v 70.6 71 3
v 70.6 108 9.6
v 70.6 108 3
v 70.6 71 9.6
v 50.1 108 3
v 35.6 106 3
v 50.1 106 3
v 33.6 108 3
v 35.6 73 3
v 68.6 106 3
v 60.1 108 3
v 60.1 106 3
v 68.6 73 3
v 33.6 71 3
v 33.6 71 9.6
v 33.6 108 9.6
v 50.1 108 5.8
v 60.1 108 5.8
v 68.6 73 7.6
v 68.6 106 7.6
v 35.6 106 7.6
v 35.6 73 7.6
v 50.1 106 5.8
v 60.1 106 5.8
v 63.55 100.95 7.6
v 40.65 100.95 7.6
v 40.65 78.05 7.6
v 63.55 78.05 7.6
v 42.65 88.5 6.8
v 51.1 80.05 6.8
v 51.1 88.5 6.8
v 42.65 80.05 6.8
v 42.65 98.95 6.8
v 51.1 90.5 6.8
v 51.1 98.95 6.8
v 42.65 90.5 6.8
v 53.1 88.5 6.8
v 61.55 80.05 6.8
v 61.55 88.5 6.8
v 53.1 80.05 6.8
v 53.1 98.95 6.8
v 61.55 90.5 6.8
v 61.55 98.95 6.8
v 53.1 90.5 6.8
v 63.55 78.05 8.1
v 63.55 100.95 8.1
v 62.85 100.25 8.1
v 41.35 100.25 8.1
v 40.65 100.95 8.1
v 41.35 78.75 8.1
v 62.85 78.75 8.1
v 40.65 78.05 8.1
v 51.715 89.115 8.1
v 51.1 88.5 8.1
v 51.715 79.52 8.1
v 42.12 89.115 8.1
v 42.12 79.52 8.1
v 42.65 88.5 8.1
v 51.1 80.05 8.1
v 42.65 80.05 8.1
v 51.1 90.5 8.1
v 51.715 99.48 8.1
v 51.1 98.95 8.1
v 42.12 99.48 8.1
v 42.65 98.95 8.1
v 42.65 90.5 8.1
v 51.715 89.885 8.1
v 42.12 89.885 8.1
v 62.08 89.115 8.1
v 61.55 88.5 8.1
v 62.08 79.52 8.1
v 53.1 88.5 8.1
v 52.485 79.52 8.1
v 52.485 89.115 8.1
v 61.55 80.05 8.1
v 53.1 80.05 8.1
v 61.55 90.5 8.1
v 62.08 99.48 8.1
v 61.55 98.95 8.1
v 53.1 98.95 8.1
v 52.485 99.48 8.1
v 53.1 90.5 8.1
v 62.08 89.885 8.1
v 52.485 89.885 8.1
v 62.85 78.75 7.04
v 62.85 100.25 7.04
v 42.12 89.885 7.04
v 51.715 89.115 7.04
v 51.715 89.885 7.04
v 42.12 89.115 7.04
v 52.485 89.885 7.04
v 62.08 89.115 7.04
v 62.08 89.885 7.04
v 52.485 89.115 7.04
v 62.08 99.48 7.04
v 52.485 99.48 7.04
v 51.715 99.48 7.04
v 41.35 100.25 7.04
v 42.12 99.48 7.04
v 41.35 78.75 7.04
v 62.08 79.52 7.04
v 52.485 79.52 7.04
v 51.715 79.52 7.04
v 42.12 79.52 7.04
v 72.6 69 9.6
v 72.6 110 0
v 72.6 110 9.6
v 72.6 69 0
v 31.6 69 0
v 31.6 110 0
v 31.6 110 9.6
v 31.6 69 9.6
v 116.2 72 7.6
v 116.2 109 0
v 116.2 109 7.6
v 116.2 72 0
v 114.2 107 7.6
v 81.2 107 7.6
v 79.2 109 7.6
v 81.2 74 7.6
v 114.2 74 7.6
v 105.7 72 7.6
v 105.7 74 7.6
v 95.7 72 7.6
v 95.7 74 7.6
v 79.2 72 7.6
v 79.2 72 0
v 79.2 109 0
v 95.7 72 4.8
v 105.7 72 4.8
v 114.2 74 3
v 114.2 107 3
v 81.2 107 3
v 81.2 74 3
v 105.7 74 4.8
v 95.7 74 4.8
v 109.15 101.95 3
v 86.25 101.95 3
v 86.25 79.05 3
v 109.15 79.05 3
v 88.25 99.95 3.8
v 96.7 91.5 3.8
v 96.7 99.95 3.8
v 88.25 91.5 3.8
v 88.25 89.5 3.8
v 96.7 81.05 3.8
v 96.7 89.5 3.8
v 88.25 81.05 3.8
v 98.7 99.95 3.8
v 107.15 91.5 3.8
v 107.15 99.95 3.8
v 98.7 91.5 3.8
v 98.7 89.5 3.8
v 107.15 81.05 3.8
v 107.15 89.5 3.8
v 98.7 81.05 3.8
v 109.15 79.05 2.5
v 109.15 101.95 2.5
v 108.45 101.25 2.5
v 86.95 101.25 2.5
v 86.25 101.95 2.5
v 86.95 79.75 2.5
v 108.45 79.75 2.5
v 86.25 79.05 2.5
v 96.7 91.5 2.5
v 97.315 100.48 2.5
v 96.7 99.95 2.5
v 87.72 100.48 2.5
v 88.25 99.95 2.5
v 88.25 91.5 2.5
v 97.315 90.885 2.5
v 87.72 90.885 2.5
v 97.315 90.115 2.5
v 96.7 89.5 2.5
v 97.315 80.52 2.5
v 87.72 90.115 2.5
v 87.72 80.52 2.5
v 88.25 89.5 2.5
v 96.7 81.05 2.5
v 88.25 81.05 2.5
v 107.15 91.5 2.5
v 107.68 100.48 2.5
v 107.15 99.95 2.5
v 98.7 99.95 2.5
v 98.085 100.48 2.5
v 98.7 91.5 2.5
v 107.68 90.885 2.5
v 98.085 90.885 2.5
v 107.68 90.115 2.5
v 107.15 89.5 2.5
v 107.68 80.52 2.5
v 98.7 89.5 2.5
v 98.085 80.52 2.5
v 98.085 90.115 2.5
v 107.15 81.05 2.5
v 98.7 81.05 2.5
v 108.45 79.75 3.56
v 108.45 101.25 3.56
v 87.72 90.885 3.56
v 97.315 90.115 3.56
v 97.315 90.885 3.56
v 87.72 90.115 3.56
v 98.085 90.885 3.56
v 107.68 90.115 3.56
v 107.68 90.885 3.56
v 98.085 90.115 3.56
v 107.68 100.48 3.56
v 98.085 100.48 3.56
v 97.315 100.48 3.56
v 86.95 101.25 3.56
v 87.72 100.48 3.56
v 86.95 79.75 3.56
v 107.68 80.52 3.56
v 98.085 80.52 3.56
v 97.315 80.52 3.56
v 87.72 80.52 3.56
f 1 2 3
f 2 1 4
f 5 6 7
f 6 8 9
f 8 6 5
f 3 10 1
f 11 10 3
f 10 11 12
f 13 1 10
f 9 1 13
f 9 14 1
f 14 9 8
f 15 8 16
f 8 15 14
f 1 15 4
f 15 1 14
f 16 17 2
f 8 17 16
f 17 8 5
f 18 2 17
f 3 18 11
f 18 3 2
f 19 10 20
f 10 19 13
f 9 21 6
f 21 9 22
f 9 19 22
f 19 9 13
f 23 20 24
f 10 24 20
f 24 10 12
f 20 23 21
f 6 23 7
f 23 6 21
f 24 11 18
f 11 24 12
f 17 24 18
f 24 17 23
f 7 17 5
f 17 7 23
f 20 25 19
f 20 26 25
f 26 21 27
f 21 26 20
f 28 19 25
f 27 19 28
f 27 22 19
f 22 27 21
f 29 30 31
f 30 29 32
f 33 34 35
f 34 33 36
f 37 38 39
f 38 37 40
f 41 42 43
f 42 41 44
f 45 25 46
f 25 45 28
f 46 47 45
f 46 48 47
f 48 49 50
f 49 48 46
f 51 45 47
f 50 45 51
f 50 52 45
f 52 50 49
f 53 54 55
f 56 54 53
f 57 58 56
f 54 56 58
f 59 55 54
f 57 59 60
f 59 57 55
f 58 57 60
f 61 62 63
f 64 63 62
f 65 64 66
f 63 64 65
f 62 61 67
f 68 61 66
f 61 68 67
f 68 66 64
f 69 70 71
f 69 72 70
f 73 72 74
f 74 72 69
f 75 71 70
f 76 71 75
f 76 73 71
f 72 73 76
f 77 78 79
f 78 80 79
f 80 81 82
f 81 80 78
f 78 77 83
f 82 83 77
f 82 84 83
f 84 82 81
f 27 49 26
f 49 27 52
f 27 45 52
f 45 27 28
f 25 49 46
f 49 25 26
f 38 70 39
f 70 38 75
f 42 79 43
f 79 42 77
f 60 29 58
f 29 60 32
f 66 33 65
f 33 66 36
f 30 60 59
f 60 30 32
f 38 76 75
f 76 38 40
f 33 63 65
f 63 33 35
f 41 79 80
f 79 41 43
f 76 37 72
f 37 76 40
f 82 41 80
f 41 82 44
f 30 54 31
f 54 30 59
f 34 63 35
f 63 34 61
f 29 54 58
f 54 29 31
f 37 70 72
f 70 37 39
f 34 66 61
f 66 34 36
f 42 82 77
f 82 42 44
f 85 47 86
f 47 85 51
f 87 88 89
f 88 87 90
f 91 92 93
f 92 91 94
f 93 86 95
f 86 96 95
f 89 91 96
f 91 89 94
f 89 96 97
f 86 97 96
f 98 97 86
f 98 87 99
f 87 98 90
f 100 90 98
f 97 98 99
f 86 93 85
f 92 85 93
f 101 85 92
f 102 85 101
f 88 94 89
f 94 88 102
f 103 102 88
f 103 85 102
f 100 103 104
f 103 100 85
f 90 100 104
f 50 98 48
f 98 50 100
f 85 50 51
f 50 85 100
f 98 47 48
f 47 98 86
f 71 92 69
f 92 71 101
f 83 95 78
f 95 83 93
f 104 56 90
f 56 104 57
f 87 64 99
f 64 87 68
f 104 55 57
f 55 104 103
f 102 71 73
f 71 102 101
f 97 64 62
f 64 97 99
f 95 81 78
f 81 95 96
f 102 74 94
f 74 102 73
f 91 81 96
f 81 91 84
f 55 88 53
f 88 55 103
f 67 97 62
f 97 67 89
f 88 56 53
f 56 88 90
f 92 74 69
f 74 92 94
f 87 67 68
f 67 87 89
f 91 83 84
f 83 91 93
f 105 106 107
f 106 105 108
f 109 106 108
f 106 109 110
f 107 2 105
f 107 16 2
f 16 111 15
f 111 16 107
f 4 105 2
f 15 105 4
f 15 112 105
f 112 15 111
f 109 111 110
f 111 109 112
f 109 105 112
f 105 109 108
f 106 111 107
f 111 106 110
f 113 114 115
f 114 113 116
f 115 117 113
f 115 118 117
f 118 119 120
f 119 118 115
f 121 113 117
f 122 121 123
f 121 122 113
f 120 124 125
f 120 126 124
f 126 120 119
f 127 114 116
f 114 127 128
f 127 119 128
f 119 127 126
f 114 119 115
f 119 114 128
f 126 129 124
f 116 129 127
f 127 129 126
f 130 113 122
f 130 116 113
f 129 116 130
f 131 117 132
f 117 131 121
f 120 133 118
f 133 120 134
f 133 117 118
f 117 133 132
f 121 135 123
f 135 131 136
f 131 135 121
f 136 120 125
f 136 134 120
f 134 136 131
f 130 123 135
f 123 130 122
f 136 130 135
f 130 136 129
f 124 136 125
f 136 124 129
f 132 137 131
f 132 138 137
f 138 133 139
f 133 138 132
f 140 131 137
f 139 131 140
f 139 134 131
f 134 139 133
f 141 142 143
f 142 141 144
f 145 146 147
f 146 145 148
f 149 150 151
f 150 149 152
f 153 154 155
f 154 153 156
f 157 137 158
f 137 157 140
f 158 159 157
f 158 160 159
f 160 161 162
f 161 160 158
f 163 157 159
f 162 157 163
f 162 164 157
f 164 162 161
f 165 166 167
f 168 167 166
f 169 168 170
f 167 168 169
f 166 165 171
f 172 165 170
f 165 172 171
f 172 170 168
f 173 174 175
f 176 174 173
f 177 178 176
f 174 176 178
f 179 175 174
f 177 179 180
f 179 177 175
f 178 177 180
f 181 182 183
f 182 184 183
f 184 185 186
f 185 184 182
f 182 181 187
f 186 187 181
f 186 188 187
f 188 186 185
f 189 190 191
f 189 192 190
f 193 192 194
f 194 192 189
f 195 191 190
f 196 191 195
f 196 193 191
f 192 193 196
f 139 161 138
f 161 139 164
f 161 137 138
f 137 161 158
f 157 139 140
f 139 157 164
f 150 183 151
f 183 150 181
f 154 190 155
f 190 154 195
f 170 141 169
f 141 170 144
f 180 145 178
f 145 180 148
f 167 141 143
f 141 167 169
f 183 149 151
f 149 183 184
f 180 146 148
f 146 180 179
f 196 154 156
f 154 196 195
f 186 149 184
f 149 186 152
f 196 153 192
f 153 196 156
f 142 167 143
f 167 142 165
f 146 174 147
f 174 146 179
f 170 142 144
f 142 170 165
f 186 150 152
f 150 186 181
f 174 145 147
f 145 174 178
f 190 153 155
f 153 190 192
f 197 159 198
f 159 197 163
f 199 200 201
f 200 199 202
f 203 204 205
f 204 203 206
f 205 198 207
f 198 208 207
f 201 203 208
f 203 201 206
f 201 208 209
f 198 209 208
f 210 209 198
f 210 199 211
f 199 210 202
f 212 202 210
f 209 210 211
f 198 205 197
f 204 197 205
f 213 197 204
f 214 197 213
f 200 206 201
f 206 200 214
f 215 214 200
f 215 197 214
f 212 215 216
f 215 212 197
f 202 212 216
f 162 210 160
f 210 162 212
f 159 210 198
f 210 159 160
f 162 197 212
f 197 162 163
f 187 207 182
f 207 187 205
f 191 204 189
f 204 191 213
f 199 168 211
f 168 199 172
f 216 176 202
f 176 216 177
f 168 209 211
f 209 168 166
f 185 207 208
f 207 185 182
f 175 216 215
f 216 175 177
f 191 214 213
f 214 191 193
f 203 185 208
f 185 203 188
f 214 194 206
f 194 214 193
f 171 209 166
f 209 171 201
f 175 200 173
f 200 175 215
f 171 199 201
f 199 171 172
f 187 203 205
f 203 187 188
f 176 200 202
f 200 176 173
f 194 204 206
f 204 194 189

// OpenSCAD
$fn=100;

// size of the coverglass
coverslip_dims_x = 24;
coverslip_dims_y = 24;
coverslip_dims_z = 0.17; // glass thickness


coverslip_inner_brim_width = 2.5; //2.5; // support space beneath coverslip edges
coverslip_outer_brim_width = 2.5; //2.5; // support space beyond coverslip

// dimensions of the base 'slide' -- to fit into a standard holder
base_width = 55; // standard microscope slide = 75
base_depth = 25; // standard microscope slide = 25
base_thickness = 2;

// outer well properties - well within which the coverglass sits
base_well_thickness = 2.0;
base_well_height = 5;

// insert and main sample buffer well
insert_well_height = 5;
insert_gap_with_base = 0.3;    // gap between any side of the lid and the outer well on the slide part

num_insert_wells = 4;
insert_well_thickness = 1.0; // width of the internal walls of the chamber section

// plug-lid
plug_lid_gap_with_insert = 0.5;       // space between the plug wall and the well wall.
plug_gap_from_sample = 2; // space between bottom of the plug and the **bottom** of the coverslip

// gasket properties
gasket_width = 0.7; // width of the gasket channels or gasket ridges. This should be set to a multiple of your nozzle width!
gasket_depth = -0.8;   // positive value = depth of channel cut into insert base, to hold a fitted gasket.
                    //                  Set this to less than the actual thickness of your gasket 
                    //                  to allow some gasket to protrude.
                    // negative value = depth of a ridge protruding from insert base, e.g. to press
                    //                  into a flat gasket sheet.
                    // value of zero =  No ridges or channels flat insert base

gasket_mould_factor = 0.8; // sizing of the channels or ridges relative to the gasket_width value; tweak for best fitting of your actual gaskets.

// magnetic wings
magnet_thickness = 1.5;
magnet_radius = 2.5;

show_coverslip = false; // adds a coverslip to the model -- set to false before you print!
show_gasket = false; // adds a coverslip to the model -- set to false before you print!

// set these to true/false to show/hide the components, e.g. those you wish to print
show_main_chamber = false;
show_insert_chamber = false;
show_plug_lid = false;
show_gasket_mould = true;

show_cross_section_a = false; // adds a box to show a cross section through the long side of the base
show_cross_section_b = false; // adds a box to show a cross section through the short side of the base
show_cross_section_c = false; // adds a box to show a cross section through the gasket mould
cross_section_height_tweak = 1.8 + insert_gap_with_base; // adjust this to change the gap between the assembled components -- helps for display!

// calculated dims etc -- no need to edit anything here!

//centering
centre_x = base_width / 2;
centre_y = base_depth / 2;

// coverslip viewing hole
cslip_access_hole_x = coverslip_dims_x - 2*coverslip_inner_brim_width;
cslip_access_hole_y = coverslip_dims_y - 2*coverslip_inner_brim_width;

gasket_bounds_x = cslip_access_hole_x + coverslip_outer_brim_width;
gasket_bounds_y = cslip_access_hole_y + coverslip_outer_brim_width;

num_wells_x = floor(pow(num_insert_wells,0.5));
num_wells_y = ceil(num_insert_wells / (floor(pow(num_insert_wells,0.5))));

// base well dims
well_width_x = coverslip_dims_x + 2*coverslip_outer_brim_width + 2*base_well_thickness;
well_width_y = coverslip_dims_y + 2*coverslip_outer_brim_width + 2*base_well_thickness;
well_hole_x = coverslip_dims_x + 2*coverslip_outer_brim_width;
well_hole_y = coverslip_dims_y + 2*coverslip_outer_brim_width;

// insert main-well dims
lid_width_x = well_width_x - 2*base_well_thickness - 2*insert_gap_with_base;
lid_width_y = well_width_y - 2*base_well_thickness - 2*insert_gap_with_base;

lid_thickness_x = (lid_width_x - cslip_access_hole_x)/2;
lid_thickness_y = (lid_width_y - cslip_access_hole_y)/2;

wing_width_x = well_width_x + 6*magnet_radius;
wing_width_y = well_width_y + 6*magnet_radius;

// This module generates a gasket grid
module waffle_maker (strut_width=gasket_width, bounds_x=50, bounds_y=50, bounds_z=gasket_depth, n_struts_x=2, n_struts_y=2) {
        union() {
           
           // outer gasket
           difference() {
                  cube([bounds_x, bounds_y, 2*abs(bounds_z)]);
                    translate([strut_width, strut_width, min(0,bounds_z)-1]) {
                        cube([bounds_x - 2*strut_width,
                               bounds_y - 2*strut_width,
                               5*abs(bounds_z)]);
                    }
                }
            
            //inner gaskets                      
            per_x_offset = (bounds_x - strut_width)/n_struts_x;
            per_y_offset = (bounds_y - strut_width)/n_struts_y;
            
            // gasket strips along x
            for (gx = [1:n_struts_x - 1]) {
                translate([gx * per_x_offset, 0, 0])
                    cube([strut_width, bounds_x, 2*abs(bounds_z)]);
                }
            
            // gasket strips along y
            for (gy = [1:n_struts_y - 1]) {
                translate([ 0, gy * per_y_offset, 0])
                    cube([bounds_y, strut_width, 2*abs(bounds_z)]);
            }
        }
    }

// This module generates a gasket grid
module rod_maker (tube_radius=1, bounds_x=20, bounds_y=20, bounds_z=10, n_struts_x=2, n_struts_y=2) {

    //inner gaskets                      
    per_x_offset = (bounds_x - 2*tube_radius)/n_struts_x;
    per_y_offset = (bounds_y - 2*tube_radius)/n_struts_y;

    // gasket strips along x
    for (gx = [1:n_struts_x]) {
        for (gy = [1:n_struts_y]) {
            translate([(gx * per_x_offset) - 0.5*per_x_offset + tube_radius,
                       (gy * per_y_offset) - 0.5*per_y_offset + tube_radius,
                       0])
                cylinder(h=2*abs(bounds_z), r1=tube_radius,r2=tube_radius);
        }
    }
}

// cross section differencer
difference() {
union() {
// -----------------------------------------------------------------------
// the main chamber
// -----------------------------------------------------------------------
if (show_main_chamber) {

   // color([0.95,0.35,0.75])
    difference() {
        
        union() {
            // the end tabs to fit standard microscope stage things
            cube([base_width,base_depth, base_well_height + base_thickness]);

            // magnet base - original plan
            translate([centre_x - 3*magnet_radius - 0.5*well_width_x, centre_y - 0.5 * well_width_y, 0])
                cube([wing_width_x, well_width_y, base_well_height + base_thickness]);
            
//            // magnet base - square plan
//            translate([centre_x - 3*magnet_radius - 0.5*well_width_x, centre_y - 0.5 * wing_width_x, 0])
//                cube([wing_width_x, wing_width_x, base_well_height + base_thickness]);
            
        }
        
        translate([centre_x - 3*magnet_radius - 0.5*well_width_x, centre_y - 0.5 * well_width_y, 0]) {
        
            // magnets left
            translate([0.5*(wing_width_x - well_width_x) - magnet_radius, 0, base_well_height+base_thickness - magnet_thickness]) {
                translate([0,0.15*well_width_y,0]) cylinder(h=magnet_thickness+0.5, r1=magnet_radius, r2=magnet_radius);
                translate([0,0.85*well_width_y,0]) cylinder(h=magnet_thickness+0.5, r1=magnet_radius, r2=magnet_radius);
            }

            // magnets right
            translate([(wing_width_x - 0.5*(wing_width_x - well_width_x)) + magnet_radius, 0, base_well_height + base_thickness - magnet_thickness]) {
                translate([0,0.15*well_width_y,0]) cylinder(h=magnet_thickness+0.5, r1=magnet_radius, r2=magnet_radius);
                translate([0,0.85*well_width_y,0]) cylinder(h=magnet_thickness+0.5, r1=magnet_radius, r2=magnet_radius);
            }
        }
        

        
        // main well hole
        translate([centre_x - 0.5*well_width_x + base_well_thickness, centre_y - 0.5*well_width_y + base_well_thickness, base_thickness]) 
            cube([well_hole_x, well_hole_y, 2*base_well_height]);
        
        // coverslip shallow hole
        translate([centre_x - 0.5*coverslip_dims_x-0.5, centre_y - 0.5*coverslip_dims_x-0.5, 0.5*base_thickness])
             union() {
                cube([coverslip_dims_x+1,coverslip_dims_y+1, 2*base_well_height]); // the dent for the slip
                translate([0,coverslip_dims_y-0.5, -0.25*base_thickness])
                   hull() {
                        cylinder(h=10,r1=2,r2=2);
                        translate([1,1.5,0]) cylinder(h=10,r1=2,r2=2);
                        translate([-2,1.5,0]) cube([2,2,10]);
                    }
            }

        // coverslip viewing hole
        translate([centre_x - 0.5*cslip_access_hole_x, centre_y - 0.5*cslip_access_hole_y, -base_thickness])
           cube([cslip_access_hole_x,cslip_access_hole_y,3*base_thickness]);
    }
}



// -----------------------------------------------------------------------
// a fake coverslip
// -----------------------------------------------------------------------
if (show_coverslip) {
     translate([centre_x - 0.5*coverslip_dims_x, centre_y - 0.5*coverslip_dims_x, (0.5*base_thickness)- coverslip_dims_z]) 
        color([0.75,0.75,0.75, 0.35])
        cube([coverslip_dims_x,coverslip_dims_y,coverslip_dims_z]);
}

// -----------------------------------------------------------------------
// a fake gasket
// -----------------------------------------------------------------------
if (show_gasket) {
     translate([centre_x - 0.5*(cslip_access_hole_x + 2*gasket_width + (coverslip_inner_brim_width - gasket_width)) + 0.5*gasket_width, 
                centre_y - 0.5*(cslip_access_hole_y + 2*gasket_width + (coverslip_inner_brim_width - gasket_width)), 
                (0.5*base_thickness) + coverslip_dims_z]) 
        color([0.2,0.2,0.75, 0.5])
        scale([1,1,0.5]) waffle_maker(strut_width=0.8*gasket_width, bounds_x=gasket_bounds_x, bounds_y=gasket_bounds_y, bounds_z=gasket_depth, n_struts_x=num_wells_x, n_struts_y=num_wells_y);
;
}




// -----------------------------------------------------------------------
// the insert
// -----------------------------------------------------------------------
if (show_insert_chamber) {
// remove commenting here to show the insert assembled with the base
//        translate([centre_x*2, 0, insert_well_height + base_thickness + coverslip_dims_z + 1.75*cross_section_height_tweak])
//        rotate([0,180,0]) {
    
// commenting next line when showing the insert assembled with the base
    translate([0,1.5*coverslip_dims_y,0]) {
       // color([0.95,0.75,0.25,1.0])
        difference() {
            
            union() { // combines a box for the buffer/sample + magnet wings + (optional) raised ridges
                                
                // insert outer box
                outbox_z = insert_well_height - abs(min(1-0.25*gasket_depth,gasket_depth));
                translate([centre_x - 0.5*lid_width_x , centre_y - 0.5*lid_width_y, 0]) {
                    difference() {
                        translate([-0.5*(wing_width_x - lid_width_x), -1, 0]) cube([wing_width_x, lid_width_y+2, base_thickness + magnet_thickness]);
                        
                        translate([(lid_width_x - (cslip_access_hole_x + coverslip_outer_brim_width))/2,
                                   (lid_width_y - (cslip_access_hole_y + coverslip_outer_brim_width))/2,
                                    -outbox_z]) {
                            cube([cslip_access_hole_x + coverslip_outer_brim_width,
                                  cslip_access_hole_y + coverslip_outer_brim_width,
                                  2.5*outbox_z]);
                        }
                    }
                    
                // well walls
                    translate([((lid_width_x - (cslip_access_hole_x + coverslip_outer_brim_width)-2*gasket_width)/2),
                                (lid_width_y - (cslip_access_hole_y + coverslip_outer_brim_width)-2*gasket_width)/2,
                                 0])
                    color([0.95,0.75,0.25,1.0]) waffle_maker(strut_width=base_well_thickness,
                                                                bounds_x=gasket_bounds_x+2*gasket_width,
                                                                bounds_y=gasket_bounds_y+2*gasket_width,
                                                                bounds_z=outbox_z,
                                                                n_struts_x=num_wells_x,
                                                                n_struts_y=num_wells_y);
                    }
                    
                // magnetic base
//                translate([centre_x - 0.5*wing_width_x , centre_y - 0.5*lid_width_y, 0])
//                    cube([wing_width_x, lid_width_y, 2*magnet_thickness]);
    
                // gasket ridges
                if (gasket_depth < 0) {
                    //offset_extra = 1.5*abs(min(0,gasket_depth)); // declarative languages are super annoying.
                    z_offset = insert_well_height + min(0,gasket_depth) + base_thickness + magnet_thickness ;
                    translate([centre_x - 0.5*(cslip_access_hole_x + coverslip_inner_brim_width),
                               centre_y - 0.5*(cslip_access_hole_y + coverslip_inner_brim_width),
                               z_offset]) 
                       waffle_maker(strut_width=gasket_width, bounds_x=gasket_bounds_x, bounds_y=gasket_bounds_y, bounds_z=gasket_depth, n_struts_x=num_wells_x, n_struts_y=num_wells_y);;
                }
                
                //surround to fit main chamber
                    difference() {
                        translate([centre_x - 0.5*(well_hole_x - 2*plug_lid_gap_with_insert),
                                   centre_y - 0.5*(well_hole_y - 2*plug_lid_gap_with_insert),
                                   z_offset])
                            cube([well_hole_x - 2*plug_lid_gap_with_insert, well_hole_y - 2*plug_lid_gap_with_insert, 1.8*outbox_z]);
                        
//                        translate([(lid_width_x - (cslip_access_hole_x + coverslip_outer_brim_width))/2,
//                                   (lid_width_y - (cslip_access_hole_y + coverslip_outer_brim_width))/2,
//                                    -outbox_z]) {
                        translate([centre_x - 0.5*(cslip_access_hole_x + coverslip_outer_brim_width),
                                   centre_y - 0.5*(cslip_access_hole_y + coverslip_outer_brim_width),
                                   z_offset])            
                             cube([cslip_access_hole_x + coverslip_outer_brim_width,
                                  cslip_access_hole_y + coverslip_outer_brim_width,
                                  2.5*outbox_z]);
                      //  }
                    }

            }
        

                
            // Magnet spots    
            translate([centre_x - 3*magnet_radius - 0.5*well_width_x, centre_y - 0.5 * well_width_y, base_thickness]) {
                // magnets left
                translate([0.5*(wing_width_x - well_width_x) - magnet_radius, 0, 0]) {
                      translate([0,0.15*well_width_y,0]) cylinder(h=magnet_thickness+0.5, r1=magnet_radius, r2=magnet_radius);
                      translate([0,0.85*well_width_y,0]) cylinder(h=magnet_thickness+0.5, r1=magnet_radius, r2=magnet_radius);
                }
                // magnets right
                translate([(wing_width_x - 0.5*(wing_width_x - well_width_x)) + magnet_radius, 0, 0]) {
                     translate([0,0.15*well_width_y,0]) cylinder(h=magnet_thickness+0.5, r1=magnet_radius, r2=magnet_radius);
                     translate([0,0.85*well_width_y,0]) cylinder(h=magnet_thickness+0.5, r1=magnet_radius, r2=magnet_radius);
                }
            
            }
                

            // cutout to mate around coverslip 'well'
            translate([centre_x - 0.5*lid_width_x - insert_gap_with_base,
                       centre_y - 0.5*lid_width_y - insert_gap_with_base,
                       insert_well_height + base_thickness]) {
                difference() {
                    cube([well_hole_x, well_hole_y, base_thickness]);
                    translate([0.5*(well_hole_x - (coverslip_dims_x + 1)) + insert_gap_with_base, 
                              0.5*(well_hole_y - (coverslip_dims_y + 1)),
                              -base_thickness])
                        cube([coverslip_dims_x + 1 - 2*insert_gap_with_base, coverslip_dims_y + 1 - 2*insert_gap_with_base, 3*base_thickness]); 
                }
            }


    
        // gasket channel
        if (gasket_depth >= 0) {
            
            offset_extra = 2*abs(min(0,gasket_depth)); // declarative languages are super annoying.
            z_offset = (insert_well_height + 1.5*base_thickness) - gasket_depth - offset_extra;
            translate([centre_x - 0.5*(cslip_access_hole_x + coverslip_inner_brim_width),
                       centre_y - 0.5*(cslip_access_hole_y + coverslip_inner_brim_width),
                       z_offset])
                  waffle_maker(strut_width=gasket_width, bounds_x=gasket_bounds_x, bounds_y=gasket_bounds_y, bounds_z=4*gasket_depth, n_struts_x=num_wells_x, n_struts_y=num_wells_y);
        }
    }
}
}

// -----------------------------------------------------------------------
// plugs - reduces exposure of sample buffer to atmosphere
// -----------------------------------------------------------------------
if (show_plug_lid) {
    //// remove commenting here to show the insert assembled with the base
//    translate([centre_x*1.425,1.2, insert_well_height + 2.5* base_thickness + coverslip_dims_z + insert_gap_with_base + 1.8*cross_section_height_tweak])
//    rotate([0,180,0]) {

plug_height = insert_well_height + 3 - plug_gap_from_sample + abs(min(1-0.25*gasket_depth,gasket_depth)); //+ abs(min(0,gasket_depth)); // + 1.5* base_thickness + 3 - plug_gap_from_sample + abs(min(0,gasket_depth));
    // insert_well_height - abs(min(1-0.5*gasket_depth,gasket_depth));
    // commenting next line when showing the insert assembled with the base
    translate([0,3*coverslip_dims_y,0]) {
        color([0.15,0.85,0.75])
        difference() {
           union() {
                translate([gasket_width-2.5,gasket_width-2.5,0]) cube([gasket_bounds_x+5, gasket_bounds_x+5, 3]);
                translate([0.5,0.5,3]) cube([gasket_bounds_x+gasket_width-0.5, gasket_bounds_y+gasket_width-0.5, plug_height]);
            }

           translate([0,0,3])
            waffle_maker(strut_width=base_well_thickness + plug_lid_gap_with_insert,
                         bounds_x=(gasket_bounds_x + 2*gasket_width + plug_lid_gap_with_insert),
                         bounds_y=(gasket_bounds_y + 2*gasket_width + plug_lid_gap_with_insert),
                         bounds_z=plug_height,
                         n_struts_x=num_wells_x,
                         n_struts_y=num_wells_y);
        
            translate([0,0,-plug_height])
               rod_maker(bounds_x=(gasket_bounds_x + 2*gasket_width + plug_lid_gap_with_insert),
                         bounds_y=(gasket_bounds_y + 2*gasket_width + plug_lid_gap_with_insert),
                         bounds_z=3*plug_height,
                         n_struts_x=num_wells_x,
                         n_struts_y=num_wells_y);
        }
    }
}

// -----------------------------------------------------------------------
// Casting tray - make your own gaskets here in PDMS or 3% agarose!
// -----------------------------------------------------------------------


//close of cross section
}
if (show_cross_section_a) translate([-5,-33,-5]) color([1,0,0]) cube([100,50,50]); // cross section block
if (show_cross_section_b) translate([-18,-5,-5]) color([1,0,0]) cube([0.5*base_width,50,50]); // cross section block
}
//close of cross section


difference() {
if (show_gasket_mould) {
    
    tray_thickness = 3;
    
    wall_height = tray_thickness + abs(gasket_depth);


     // negative mould (for recasting in plaster or something
    rotate([180,0,0]) {
        translate([1.4*coverslip_dims_x,-4.5*coverslip_dims_y,-2*wall_height - tray_thickness]) {
            difference() {
             
     
                // outer mould
                translate([-2,-2,1]) difference() {
                    cube([well_width_x+8, well_width_y+8, 2*wall_height + tray_thickness - 1]);
                }
                     

                // imprint of the original mould
                union() {
        difference() { // make inverse casting mould
            union() {
                
                // base of the tray
                cube([well_width_x+4, well_width_y+4, 3]);
                
                translate([((well_width_x+4 - (cslip_access_hole_x + coverslip_outer_brim_width)-gasket_width)/2),
                        (well_width_y+4 - (cslip_access_hole_y + coverslip_outer_brim_width)-gasket_width)/2,
                        0])
                    cube([gasket_bounds_x+(gasket_width), gasket_bounds_y+(gasket_width), 3.8]);

                 // outer casting wall
                 difference() {
                    cube([well_width_x+4, well_width_y+4, 2*(3+abs(gasket_depth))]);
                    translate([2,2,-0.5*(3+abs(gasket_depth))]) cube([well_width_x, well_width_y, 4*(3+abs(gasket_depth))]);
                    //overflow tube
                    translate([0.5*(well_width_x),-2,abs(gasket_depth)+4]) cube([10,5,5]); //scale([1,1,0.3]) rotate([90,0,0]) cylinder(3,3,5);
                 }

             }
             
             // imprint of sample wells
             translate([((well_width_x+4 - (cslip_access_hole_x + coverslip_outer_brim_width)-2*gasket_width)/2),
                        (well_width_y+4 - (cslip_access_hole_y + coverslip_outer_brim_width)-2*gasket_width)/2,
                        2.5])
                waffle_maker(strut_width=base_well_thickness,
                             bounds_x=gasket_bounds_x+2*gasket_width,
                             bounds_y=gasket_bounds_y+2*gasket_width,
                             bounds_z=5,
                             n_struts_x=num_wells_x,
                             n_struts_y=num_wells_y);
                
                    


       
  
            if (gasket_depth > 0) {
                offset_extra = 3*abs(min(0,gasket_depth)); // declarative languages are super annoying.
                z_offset = (insert_well_height + 1.5*base_thickness) - gasket_depth - offset_extra;
                translate([0.5*((well_width_x+4) - gasket_bounds_x),
                           0.5*((well_width_y+4) - gasket_bounds_y),
                           2.5 - gasket_depth]) 
                    waffle_maker(strut_width=0.9*gasket_width,
                                 bounds_x=gasket_bounds_x,
                                 bounds_y=gasket_bounds_y,
                                 bounds_z=0.9*gasket_depth,
                                 n_struts_x=num_wells_x,
                                 n_struts_y=num_wells_y);
            }
        }
            // gasket ridges
            if (gasket_depth < 0) {
                offset_extra = 3*abs(min(0,gasket_depth)); // declarative languages are super annoying.
                z_offset = (insert_well_height + 1.5*base_thickness) - gasket_depth - offset_extra;
                translate([0.5*((well_width_x+4) - gasket_bounds_x),
                           0.5*((well_width_y+4) - gasket_bounds_y),
                           2.5 - gasket_width]) 
                    waffle_maker(strut_width=1.1*gasket_width,
                                 bounds_x=gasket_bounds_x,
                                 bounds_y=gasket_bounds_y,
                                 bounds_z=1.1*gasket_depth,
                                 n_struts_x=num_wells_x,
                                 n_struts_y=num_wells_y);
            }
        }

        }
    }
}


   
    
    // positive mould for direct casting in rubber
    translate([3.3*coverslip_dims_x, 3*coverslip_dims_y,0]) {
    union() {
        difference() { // make inverse casting mould
            union() {
                
                // base of the tray
                cube([well_width_x+4, well_width_y+4, 3]);
                
                translate([((well_width_x+4 - (cslip_access_hole_x + coverslip_outer_brim_width)-gasket_width)/2),
                        (well_width_y+4 - (cslip_access_hole_y + coverslip_outer_brim_width)-gasket_width)/2,
                        0])
                    cube([gasket_bounds_x+(gasket_width), gasket_bounds_y+(gasket_width), 3.8]);

                 // outer casting wall
                 difference() {
                    cube([well_width_x+4, well_width_y+4, 2*(3+abs(gasket_depth))]);
                    translate([2,2,-0.5*(3+abs(gasket_depth))]) cube([well_width_x, well_width_y, 4*(3+abs(gasket_depth))]);
                    //overflow tube
                    translate([0.5*(well_width_x),-2,abs(gasket_depth)+4]) cube([10,5,5]); //scale([1,1,0.3]) rotate([90,0,0]) cylinder(3,3,5);
                 }

             }
             
             // imprint of sample wells
             translate([((well_width_x+4 - (cslip_access_hole_x + coverslip_outer_brim_width)-2*gasket_width)/2),
                        (well_width_y+4 - (cslip_access_hole_y + coverslip_outer_brim_width)-2*gasket_width)/2,
                        2.5])
                waffle_maker(strut_width=base_well_thickness,
                             bounds_x=gasket_bounds_x+2*gasket_width,
                             bounds_y=gasket_bounds_y+2*gasket_width,
                             bounds_z=5,
                             n_struts_x=num_wells_x,
                             n_struts_y=num_wells_y);
                
                    


       
  
            if (gasket_depth > 0) {
                offset_extra = 3*abs(min(0,gasket_depth)); // declarative languages are super annoying.
                z_offset = (insert_well_height + 1.5*base_thickness) - gasket_depth - offset_extra;
                translate([0.5*((well_width_x+4) - gasket_bounds_x),
                           0.5*((well_width_y+4) - gasket_bounds_y),
                           2.5 - gasket_depth]) 
                    waffle_maker(strut_width=0.9*gasket_width,
                                 bounds_x=gasket_bounds_x,
                                 bounds_y=gasket_bounds_y,
                                 bounds_z=0.9*gasket_depth,
                                 n_struts_x=num_wells_x,
                                 n_struts_y=num_wells_y);
            }
        }
            // gasket ridges
            if (gasket_depth < 0) {
                offset_extra = 3*abs(min(0,gasket_depth)); // declarative languages are super annoying.
                z_offset = (insert_well_height + 1.5*base_thickness) - gasket_depth - offset_extra;
                translate([0.5*((well_width_x+4) - gasket_bounds_x),
                           0.5*((well_width_y+4) - gasket_bounds_y),
                           2.5 - gasket_width]) 
                    waffle_maker(strut_width=1.1*gasket_width,
                                 bounds_x=gasket_bounds_x,
                                 bounds_y=gasket_bounds_y,
                                 bounds_z=1.1*gasket_depth,
                                 n_struts_x=num_wells_x,
                                 n_struts_y=num_wells_y);
            }
            
//        // support rods for coverslip to get the spacing right
//           translate([0.5*((well_width_x+2) - gasket_bounds_x),
//                           0.5*((well_width_y+2) - gasket_bounds_y),
//                           2.85 - gasket_width])            
//            rod_maker(bounds_x=(gasket_bounds_x + 2*gasket_width + plug_lid_gap_with_insert),
//                         bounds_y=(gasket_bounds_y + 2*gasket_width + plug_lid_gap_with_insert),
//                         bounds_z=1.1*gasket_depth,
//                         n_struts_x=num_wells_x,
//                         n_struts_y=num_wells_y);
            
            }
    }
}

// if (show_cross_section_a) translate([-5,-38,-5]) color([0,0,1]) cube([100,50,50]); // cross section block
if (show_cross_section_c) translate([coverslip_dims_x,1.45*coverslip_dims_y,-5]) color([1,0,0]) cube([100,50,50]); // cross section block

}


// some useful information will be displayed in the console window

echo(str("Coverslip viewport = ", cslip_access_hole_x, " by ", cslip_access_hole_y,  " mm")) ;

outer_well_volume = (well_hole_x * well_hole_y * base_well_height)/pow(10,3);
echo(str("Outer well size = ", well_hole_x, " mm by ", well_hole_y, " mm by ", base_well_height, " mm (",outer_well_volume," ml total)")) ;

lid_volume = (cslip_access_hole_x * cslip_access_hole_y * insert_well_height)/pow(10,3);
echo(str("Inner well size = ", cslip_access_hole_x, " mm by ", cslip_access_hole_y,  " mm by ", insert_well_height ,"mm (",lid_volume," ml total)")) ;

echo(str("Wells x = ", num_wells_x, " Wells y = ", num_wells_y)) ;
